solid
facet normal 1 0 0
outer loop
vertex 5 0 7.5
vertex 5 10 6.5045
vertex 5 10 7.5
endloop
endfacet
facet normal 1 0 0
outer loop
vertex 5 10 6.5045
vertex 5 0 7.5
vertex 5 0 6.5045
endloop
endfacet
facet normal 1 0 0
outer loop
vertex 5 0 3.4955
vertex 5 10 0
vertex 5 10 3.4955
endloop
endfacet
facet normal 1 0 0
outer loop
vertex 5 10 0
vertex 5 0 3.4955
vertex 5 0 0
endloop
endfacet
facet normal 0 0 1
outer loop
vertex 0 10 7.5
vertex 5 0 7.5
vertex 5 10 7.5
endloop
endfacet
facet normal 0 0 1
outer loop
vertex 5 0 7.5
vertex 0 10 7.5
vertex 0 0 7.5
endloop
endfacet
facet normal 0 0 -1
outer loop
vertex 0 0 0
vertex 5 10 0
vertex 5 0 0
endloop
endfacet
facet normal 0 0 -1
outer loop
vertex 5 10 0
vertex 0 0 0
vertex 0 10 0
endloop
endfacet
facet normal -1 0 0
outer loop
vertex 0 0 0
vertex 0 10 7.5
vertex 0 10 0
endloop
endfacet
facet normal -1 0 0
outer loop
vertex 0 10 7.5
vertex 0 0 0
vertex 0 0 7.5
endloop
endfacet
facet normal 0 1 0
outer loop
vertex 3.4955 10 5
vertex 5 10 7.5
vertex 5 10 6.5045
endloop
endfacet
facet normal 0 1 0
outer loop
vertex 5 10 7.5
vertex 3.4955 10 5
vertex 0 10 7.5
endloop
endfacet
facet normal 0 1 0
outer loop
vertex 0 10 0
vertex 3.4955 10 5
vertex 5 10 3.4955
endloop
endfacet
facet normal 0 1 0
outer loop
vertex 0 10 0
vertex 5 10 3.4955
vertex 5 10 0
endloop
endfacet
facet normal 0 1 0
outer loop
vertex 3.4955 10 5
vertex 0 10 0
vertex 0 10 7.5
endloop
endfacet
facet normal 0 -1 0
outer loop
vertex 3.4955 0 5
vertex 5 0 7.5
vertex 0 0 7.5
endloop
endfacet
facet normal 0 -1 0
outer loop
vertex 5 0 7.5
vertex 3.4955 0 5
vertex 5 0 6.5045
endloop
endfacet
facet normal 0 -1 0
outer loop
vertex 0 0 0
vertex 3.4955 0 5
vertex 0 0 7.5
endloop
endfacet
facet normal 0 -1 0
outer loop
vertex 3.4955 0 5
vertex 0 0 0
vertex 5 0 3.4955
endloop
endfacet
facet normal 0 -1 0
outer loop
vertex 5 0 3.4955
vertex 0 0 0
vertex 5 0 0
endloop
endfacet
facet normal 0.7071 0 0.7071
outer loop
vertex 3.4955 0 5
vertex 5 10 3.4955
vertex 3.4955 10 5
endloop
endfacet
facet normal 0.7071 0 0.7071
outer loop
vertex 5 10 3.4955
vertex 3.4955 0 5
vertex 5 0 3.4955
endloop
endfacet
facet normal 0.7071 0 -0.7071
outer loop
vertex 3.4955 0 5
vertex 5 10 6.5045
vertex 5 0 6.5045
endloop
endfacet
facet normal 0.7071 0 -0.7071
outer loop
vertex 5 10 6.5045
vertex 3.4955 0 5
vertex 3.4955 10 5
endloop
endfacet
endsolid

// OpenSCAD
// All dimensions in mm.


$fn = 360;

// difference() fudge factor
fuj = 0.2;





//
// Modules
//

module clamp(n=1) {

  clamp_basic();

}


module clamp_basic(clamp_l=10) {

  clamp_w=5;
  notch_h = 3;
  notch_z = 5;  // distance from bottom of body to center of notch

  clamp_h = notch_z + (notch_h/2) + 1;

  difference() {
    // body
    cube([clamp_w, clamp_l, clamp_h]);
    // notch
#   translate([clamp_w, clamp_l/2, notch_z])
      rotate([0, 45, 0])
        cube([notch_h/1.41, clamp_l+fuj, notch_h/1.41], center=true);
  }
}





//
// Main
//

X = 2;
Y = 4;
Z = 6;

clamp();
